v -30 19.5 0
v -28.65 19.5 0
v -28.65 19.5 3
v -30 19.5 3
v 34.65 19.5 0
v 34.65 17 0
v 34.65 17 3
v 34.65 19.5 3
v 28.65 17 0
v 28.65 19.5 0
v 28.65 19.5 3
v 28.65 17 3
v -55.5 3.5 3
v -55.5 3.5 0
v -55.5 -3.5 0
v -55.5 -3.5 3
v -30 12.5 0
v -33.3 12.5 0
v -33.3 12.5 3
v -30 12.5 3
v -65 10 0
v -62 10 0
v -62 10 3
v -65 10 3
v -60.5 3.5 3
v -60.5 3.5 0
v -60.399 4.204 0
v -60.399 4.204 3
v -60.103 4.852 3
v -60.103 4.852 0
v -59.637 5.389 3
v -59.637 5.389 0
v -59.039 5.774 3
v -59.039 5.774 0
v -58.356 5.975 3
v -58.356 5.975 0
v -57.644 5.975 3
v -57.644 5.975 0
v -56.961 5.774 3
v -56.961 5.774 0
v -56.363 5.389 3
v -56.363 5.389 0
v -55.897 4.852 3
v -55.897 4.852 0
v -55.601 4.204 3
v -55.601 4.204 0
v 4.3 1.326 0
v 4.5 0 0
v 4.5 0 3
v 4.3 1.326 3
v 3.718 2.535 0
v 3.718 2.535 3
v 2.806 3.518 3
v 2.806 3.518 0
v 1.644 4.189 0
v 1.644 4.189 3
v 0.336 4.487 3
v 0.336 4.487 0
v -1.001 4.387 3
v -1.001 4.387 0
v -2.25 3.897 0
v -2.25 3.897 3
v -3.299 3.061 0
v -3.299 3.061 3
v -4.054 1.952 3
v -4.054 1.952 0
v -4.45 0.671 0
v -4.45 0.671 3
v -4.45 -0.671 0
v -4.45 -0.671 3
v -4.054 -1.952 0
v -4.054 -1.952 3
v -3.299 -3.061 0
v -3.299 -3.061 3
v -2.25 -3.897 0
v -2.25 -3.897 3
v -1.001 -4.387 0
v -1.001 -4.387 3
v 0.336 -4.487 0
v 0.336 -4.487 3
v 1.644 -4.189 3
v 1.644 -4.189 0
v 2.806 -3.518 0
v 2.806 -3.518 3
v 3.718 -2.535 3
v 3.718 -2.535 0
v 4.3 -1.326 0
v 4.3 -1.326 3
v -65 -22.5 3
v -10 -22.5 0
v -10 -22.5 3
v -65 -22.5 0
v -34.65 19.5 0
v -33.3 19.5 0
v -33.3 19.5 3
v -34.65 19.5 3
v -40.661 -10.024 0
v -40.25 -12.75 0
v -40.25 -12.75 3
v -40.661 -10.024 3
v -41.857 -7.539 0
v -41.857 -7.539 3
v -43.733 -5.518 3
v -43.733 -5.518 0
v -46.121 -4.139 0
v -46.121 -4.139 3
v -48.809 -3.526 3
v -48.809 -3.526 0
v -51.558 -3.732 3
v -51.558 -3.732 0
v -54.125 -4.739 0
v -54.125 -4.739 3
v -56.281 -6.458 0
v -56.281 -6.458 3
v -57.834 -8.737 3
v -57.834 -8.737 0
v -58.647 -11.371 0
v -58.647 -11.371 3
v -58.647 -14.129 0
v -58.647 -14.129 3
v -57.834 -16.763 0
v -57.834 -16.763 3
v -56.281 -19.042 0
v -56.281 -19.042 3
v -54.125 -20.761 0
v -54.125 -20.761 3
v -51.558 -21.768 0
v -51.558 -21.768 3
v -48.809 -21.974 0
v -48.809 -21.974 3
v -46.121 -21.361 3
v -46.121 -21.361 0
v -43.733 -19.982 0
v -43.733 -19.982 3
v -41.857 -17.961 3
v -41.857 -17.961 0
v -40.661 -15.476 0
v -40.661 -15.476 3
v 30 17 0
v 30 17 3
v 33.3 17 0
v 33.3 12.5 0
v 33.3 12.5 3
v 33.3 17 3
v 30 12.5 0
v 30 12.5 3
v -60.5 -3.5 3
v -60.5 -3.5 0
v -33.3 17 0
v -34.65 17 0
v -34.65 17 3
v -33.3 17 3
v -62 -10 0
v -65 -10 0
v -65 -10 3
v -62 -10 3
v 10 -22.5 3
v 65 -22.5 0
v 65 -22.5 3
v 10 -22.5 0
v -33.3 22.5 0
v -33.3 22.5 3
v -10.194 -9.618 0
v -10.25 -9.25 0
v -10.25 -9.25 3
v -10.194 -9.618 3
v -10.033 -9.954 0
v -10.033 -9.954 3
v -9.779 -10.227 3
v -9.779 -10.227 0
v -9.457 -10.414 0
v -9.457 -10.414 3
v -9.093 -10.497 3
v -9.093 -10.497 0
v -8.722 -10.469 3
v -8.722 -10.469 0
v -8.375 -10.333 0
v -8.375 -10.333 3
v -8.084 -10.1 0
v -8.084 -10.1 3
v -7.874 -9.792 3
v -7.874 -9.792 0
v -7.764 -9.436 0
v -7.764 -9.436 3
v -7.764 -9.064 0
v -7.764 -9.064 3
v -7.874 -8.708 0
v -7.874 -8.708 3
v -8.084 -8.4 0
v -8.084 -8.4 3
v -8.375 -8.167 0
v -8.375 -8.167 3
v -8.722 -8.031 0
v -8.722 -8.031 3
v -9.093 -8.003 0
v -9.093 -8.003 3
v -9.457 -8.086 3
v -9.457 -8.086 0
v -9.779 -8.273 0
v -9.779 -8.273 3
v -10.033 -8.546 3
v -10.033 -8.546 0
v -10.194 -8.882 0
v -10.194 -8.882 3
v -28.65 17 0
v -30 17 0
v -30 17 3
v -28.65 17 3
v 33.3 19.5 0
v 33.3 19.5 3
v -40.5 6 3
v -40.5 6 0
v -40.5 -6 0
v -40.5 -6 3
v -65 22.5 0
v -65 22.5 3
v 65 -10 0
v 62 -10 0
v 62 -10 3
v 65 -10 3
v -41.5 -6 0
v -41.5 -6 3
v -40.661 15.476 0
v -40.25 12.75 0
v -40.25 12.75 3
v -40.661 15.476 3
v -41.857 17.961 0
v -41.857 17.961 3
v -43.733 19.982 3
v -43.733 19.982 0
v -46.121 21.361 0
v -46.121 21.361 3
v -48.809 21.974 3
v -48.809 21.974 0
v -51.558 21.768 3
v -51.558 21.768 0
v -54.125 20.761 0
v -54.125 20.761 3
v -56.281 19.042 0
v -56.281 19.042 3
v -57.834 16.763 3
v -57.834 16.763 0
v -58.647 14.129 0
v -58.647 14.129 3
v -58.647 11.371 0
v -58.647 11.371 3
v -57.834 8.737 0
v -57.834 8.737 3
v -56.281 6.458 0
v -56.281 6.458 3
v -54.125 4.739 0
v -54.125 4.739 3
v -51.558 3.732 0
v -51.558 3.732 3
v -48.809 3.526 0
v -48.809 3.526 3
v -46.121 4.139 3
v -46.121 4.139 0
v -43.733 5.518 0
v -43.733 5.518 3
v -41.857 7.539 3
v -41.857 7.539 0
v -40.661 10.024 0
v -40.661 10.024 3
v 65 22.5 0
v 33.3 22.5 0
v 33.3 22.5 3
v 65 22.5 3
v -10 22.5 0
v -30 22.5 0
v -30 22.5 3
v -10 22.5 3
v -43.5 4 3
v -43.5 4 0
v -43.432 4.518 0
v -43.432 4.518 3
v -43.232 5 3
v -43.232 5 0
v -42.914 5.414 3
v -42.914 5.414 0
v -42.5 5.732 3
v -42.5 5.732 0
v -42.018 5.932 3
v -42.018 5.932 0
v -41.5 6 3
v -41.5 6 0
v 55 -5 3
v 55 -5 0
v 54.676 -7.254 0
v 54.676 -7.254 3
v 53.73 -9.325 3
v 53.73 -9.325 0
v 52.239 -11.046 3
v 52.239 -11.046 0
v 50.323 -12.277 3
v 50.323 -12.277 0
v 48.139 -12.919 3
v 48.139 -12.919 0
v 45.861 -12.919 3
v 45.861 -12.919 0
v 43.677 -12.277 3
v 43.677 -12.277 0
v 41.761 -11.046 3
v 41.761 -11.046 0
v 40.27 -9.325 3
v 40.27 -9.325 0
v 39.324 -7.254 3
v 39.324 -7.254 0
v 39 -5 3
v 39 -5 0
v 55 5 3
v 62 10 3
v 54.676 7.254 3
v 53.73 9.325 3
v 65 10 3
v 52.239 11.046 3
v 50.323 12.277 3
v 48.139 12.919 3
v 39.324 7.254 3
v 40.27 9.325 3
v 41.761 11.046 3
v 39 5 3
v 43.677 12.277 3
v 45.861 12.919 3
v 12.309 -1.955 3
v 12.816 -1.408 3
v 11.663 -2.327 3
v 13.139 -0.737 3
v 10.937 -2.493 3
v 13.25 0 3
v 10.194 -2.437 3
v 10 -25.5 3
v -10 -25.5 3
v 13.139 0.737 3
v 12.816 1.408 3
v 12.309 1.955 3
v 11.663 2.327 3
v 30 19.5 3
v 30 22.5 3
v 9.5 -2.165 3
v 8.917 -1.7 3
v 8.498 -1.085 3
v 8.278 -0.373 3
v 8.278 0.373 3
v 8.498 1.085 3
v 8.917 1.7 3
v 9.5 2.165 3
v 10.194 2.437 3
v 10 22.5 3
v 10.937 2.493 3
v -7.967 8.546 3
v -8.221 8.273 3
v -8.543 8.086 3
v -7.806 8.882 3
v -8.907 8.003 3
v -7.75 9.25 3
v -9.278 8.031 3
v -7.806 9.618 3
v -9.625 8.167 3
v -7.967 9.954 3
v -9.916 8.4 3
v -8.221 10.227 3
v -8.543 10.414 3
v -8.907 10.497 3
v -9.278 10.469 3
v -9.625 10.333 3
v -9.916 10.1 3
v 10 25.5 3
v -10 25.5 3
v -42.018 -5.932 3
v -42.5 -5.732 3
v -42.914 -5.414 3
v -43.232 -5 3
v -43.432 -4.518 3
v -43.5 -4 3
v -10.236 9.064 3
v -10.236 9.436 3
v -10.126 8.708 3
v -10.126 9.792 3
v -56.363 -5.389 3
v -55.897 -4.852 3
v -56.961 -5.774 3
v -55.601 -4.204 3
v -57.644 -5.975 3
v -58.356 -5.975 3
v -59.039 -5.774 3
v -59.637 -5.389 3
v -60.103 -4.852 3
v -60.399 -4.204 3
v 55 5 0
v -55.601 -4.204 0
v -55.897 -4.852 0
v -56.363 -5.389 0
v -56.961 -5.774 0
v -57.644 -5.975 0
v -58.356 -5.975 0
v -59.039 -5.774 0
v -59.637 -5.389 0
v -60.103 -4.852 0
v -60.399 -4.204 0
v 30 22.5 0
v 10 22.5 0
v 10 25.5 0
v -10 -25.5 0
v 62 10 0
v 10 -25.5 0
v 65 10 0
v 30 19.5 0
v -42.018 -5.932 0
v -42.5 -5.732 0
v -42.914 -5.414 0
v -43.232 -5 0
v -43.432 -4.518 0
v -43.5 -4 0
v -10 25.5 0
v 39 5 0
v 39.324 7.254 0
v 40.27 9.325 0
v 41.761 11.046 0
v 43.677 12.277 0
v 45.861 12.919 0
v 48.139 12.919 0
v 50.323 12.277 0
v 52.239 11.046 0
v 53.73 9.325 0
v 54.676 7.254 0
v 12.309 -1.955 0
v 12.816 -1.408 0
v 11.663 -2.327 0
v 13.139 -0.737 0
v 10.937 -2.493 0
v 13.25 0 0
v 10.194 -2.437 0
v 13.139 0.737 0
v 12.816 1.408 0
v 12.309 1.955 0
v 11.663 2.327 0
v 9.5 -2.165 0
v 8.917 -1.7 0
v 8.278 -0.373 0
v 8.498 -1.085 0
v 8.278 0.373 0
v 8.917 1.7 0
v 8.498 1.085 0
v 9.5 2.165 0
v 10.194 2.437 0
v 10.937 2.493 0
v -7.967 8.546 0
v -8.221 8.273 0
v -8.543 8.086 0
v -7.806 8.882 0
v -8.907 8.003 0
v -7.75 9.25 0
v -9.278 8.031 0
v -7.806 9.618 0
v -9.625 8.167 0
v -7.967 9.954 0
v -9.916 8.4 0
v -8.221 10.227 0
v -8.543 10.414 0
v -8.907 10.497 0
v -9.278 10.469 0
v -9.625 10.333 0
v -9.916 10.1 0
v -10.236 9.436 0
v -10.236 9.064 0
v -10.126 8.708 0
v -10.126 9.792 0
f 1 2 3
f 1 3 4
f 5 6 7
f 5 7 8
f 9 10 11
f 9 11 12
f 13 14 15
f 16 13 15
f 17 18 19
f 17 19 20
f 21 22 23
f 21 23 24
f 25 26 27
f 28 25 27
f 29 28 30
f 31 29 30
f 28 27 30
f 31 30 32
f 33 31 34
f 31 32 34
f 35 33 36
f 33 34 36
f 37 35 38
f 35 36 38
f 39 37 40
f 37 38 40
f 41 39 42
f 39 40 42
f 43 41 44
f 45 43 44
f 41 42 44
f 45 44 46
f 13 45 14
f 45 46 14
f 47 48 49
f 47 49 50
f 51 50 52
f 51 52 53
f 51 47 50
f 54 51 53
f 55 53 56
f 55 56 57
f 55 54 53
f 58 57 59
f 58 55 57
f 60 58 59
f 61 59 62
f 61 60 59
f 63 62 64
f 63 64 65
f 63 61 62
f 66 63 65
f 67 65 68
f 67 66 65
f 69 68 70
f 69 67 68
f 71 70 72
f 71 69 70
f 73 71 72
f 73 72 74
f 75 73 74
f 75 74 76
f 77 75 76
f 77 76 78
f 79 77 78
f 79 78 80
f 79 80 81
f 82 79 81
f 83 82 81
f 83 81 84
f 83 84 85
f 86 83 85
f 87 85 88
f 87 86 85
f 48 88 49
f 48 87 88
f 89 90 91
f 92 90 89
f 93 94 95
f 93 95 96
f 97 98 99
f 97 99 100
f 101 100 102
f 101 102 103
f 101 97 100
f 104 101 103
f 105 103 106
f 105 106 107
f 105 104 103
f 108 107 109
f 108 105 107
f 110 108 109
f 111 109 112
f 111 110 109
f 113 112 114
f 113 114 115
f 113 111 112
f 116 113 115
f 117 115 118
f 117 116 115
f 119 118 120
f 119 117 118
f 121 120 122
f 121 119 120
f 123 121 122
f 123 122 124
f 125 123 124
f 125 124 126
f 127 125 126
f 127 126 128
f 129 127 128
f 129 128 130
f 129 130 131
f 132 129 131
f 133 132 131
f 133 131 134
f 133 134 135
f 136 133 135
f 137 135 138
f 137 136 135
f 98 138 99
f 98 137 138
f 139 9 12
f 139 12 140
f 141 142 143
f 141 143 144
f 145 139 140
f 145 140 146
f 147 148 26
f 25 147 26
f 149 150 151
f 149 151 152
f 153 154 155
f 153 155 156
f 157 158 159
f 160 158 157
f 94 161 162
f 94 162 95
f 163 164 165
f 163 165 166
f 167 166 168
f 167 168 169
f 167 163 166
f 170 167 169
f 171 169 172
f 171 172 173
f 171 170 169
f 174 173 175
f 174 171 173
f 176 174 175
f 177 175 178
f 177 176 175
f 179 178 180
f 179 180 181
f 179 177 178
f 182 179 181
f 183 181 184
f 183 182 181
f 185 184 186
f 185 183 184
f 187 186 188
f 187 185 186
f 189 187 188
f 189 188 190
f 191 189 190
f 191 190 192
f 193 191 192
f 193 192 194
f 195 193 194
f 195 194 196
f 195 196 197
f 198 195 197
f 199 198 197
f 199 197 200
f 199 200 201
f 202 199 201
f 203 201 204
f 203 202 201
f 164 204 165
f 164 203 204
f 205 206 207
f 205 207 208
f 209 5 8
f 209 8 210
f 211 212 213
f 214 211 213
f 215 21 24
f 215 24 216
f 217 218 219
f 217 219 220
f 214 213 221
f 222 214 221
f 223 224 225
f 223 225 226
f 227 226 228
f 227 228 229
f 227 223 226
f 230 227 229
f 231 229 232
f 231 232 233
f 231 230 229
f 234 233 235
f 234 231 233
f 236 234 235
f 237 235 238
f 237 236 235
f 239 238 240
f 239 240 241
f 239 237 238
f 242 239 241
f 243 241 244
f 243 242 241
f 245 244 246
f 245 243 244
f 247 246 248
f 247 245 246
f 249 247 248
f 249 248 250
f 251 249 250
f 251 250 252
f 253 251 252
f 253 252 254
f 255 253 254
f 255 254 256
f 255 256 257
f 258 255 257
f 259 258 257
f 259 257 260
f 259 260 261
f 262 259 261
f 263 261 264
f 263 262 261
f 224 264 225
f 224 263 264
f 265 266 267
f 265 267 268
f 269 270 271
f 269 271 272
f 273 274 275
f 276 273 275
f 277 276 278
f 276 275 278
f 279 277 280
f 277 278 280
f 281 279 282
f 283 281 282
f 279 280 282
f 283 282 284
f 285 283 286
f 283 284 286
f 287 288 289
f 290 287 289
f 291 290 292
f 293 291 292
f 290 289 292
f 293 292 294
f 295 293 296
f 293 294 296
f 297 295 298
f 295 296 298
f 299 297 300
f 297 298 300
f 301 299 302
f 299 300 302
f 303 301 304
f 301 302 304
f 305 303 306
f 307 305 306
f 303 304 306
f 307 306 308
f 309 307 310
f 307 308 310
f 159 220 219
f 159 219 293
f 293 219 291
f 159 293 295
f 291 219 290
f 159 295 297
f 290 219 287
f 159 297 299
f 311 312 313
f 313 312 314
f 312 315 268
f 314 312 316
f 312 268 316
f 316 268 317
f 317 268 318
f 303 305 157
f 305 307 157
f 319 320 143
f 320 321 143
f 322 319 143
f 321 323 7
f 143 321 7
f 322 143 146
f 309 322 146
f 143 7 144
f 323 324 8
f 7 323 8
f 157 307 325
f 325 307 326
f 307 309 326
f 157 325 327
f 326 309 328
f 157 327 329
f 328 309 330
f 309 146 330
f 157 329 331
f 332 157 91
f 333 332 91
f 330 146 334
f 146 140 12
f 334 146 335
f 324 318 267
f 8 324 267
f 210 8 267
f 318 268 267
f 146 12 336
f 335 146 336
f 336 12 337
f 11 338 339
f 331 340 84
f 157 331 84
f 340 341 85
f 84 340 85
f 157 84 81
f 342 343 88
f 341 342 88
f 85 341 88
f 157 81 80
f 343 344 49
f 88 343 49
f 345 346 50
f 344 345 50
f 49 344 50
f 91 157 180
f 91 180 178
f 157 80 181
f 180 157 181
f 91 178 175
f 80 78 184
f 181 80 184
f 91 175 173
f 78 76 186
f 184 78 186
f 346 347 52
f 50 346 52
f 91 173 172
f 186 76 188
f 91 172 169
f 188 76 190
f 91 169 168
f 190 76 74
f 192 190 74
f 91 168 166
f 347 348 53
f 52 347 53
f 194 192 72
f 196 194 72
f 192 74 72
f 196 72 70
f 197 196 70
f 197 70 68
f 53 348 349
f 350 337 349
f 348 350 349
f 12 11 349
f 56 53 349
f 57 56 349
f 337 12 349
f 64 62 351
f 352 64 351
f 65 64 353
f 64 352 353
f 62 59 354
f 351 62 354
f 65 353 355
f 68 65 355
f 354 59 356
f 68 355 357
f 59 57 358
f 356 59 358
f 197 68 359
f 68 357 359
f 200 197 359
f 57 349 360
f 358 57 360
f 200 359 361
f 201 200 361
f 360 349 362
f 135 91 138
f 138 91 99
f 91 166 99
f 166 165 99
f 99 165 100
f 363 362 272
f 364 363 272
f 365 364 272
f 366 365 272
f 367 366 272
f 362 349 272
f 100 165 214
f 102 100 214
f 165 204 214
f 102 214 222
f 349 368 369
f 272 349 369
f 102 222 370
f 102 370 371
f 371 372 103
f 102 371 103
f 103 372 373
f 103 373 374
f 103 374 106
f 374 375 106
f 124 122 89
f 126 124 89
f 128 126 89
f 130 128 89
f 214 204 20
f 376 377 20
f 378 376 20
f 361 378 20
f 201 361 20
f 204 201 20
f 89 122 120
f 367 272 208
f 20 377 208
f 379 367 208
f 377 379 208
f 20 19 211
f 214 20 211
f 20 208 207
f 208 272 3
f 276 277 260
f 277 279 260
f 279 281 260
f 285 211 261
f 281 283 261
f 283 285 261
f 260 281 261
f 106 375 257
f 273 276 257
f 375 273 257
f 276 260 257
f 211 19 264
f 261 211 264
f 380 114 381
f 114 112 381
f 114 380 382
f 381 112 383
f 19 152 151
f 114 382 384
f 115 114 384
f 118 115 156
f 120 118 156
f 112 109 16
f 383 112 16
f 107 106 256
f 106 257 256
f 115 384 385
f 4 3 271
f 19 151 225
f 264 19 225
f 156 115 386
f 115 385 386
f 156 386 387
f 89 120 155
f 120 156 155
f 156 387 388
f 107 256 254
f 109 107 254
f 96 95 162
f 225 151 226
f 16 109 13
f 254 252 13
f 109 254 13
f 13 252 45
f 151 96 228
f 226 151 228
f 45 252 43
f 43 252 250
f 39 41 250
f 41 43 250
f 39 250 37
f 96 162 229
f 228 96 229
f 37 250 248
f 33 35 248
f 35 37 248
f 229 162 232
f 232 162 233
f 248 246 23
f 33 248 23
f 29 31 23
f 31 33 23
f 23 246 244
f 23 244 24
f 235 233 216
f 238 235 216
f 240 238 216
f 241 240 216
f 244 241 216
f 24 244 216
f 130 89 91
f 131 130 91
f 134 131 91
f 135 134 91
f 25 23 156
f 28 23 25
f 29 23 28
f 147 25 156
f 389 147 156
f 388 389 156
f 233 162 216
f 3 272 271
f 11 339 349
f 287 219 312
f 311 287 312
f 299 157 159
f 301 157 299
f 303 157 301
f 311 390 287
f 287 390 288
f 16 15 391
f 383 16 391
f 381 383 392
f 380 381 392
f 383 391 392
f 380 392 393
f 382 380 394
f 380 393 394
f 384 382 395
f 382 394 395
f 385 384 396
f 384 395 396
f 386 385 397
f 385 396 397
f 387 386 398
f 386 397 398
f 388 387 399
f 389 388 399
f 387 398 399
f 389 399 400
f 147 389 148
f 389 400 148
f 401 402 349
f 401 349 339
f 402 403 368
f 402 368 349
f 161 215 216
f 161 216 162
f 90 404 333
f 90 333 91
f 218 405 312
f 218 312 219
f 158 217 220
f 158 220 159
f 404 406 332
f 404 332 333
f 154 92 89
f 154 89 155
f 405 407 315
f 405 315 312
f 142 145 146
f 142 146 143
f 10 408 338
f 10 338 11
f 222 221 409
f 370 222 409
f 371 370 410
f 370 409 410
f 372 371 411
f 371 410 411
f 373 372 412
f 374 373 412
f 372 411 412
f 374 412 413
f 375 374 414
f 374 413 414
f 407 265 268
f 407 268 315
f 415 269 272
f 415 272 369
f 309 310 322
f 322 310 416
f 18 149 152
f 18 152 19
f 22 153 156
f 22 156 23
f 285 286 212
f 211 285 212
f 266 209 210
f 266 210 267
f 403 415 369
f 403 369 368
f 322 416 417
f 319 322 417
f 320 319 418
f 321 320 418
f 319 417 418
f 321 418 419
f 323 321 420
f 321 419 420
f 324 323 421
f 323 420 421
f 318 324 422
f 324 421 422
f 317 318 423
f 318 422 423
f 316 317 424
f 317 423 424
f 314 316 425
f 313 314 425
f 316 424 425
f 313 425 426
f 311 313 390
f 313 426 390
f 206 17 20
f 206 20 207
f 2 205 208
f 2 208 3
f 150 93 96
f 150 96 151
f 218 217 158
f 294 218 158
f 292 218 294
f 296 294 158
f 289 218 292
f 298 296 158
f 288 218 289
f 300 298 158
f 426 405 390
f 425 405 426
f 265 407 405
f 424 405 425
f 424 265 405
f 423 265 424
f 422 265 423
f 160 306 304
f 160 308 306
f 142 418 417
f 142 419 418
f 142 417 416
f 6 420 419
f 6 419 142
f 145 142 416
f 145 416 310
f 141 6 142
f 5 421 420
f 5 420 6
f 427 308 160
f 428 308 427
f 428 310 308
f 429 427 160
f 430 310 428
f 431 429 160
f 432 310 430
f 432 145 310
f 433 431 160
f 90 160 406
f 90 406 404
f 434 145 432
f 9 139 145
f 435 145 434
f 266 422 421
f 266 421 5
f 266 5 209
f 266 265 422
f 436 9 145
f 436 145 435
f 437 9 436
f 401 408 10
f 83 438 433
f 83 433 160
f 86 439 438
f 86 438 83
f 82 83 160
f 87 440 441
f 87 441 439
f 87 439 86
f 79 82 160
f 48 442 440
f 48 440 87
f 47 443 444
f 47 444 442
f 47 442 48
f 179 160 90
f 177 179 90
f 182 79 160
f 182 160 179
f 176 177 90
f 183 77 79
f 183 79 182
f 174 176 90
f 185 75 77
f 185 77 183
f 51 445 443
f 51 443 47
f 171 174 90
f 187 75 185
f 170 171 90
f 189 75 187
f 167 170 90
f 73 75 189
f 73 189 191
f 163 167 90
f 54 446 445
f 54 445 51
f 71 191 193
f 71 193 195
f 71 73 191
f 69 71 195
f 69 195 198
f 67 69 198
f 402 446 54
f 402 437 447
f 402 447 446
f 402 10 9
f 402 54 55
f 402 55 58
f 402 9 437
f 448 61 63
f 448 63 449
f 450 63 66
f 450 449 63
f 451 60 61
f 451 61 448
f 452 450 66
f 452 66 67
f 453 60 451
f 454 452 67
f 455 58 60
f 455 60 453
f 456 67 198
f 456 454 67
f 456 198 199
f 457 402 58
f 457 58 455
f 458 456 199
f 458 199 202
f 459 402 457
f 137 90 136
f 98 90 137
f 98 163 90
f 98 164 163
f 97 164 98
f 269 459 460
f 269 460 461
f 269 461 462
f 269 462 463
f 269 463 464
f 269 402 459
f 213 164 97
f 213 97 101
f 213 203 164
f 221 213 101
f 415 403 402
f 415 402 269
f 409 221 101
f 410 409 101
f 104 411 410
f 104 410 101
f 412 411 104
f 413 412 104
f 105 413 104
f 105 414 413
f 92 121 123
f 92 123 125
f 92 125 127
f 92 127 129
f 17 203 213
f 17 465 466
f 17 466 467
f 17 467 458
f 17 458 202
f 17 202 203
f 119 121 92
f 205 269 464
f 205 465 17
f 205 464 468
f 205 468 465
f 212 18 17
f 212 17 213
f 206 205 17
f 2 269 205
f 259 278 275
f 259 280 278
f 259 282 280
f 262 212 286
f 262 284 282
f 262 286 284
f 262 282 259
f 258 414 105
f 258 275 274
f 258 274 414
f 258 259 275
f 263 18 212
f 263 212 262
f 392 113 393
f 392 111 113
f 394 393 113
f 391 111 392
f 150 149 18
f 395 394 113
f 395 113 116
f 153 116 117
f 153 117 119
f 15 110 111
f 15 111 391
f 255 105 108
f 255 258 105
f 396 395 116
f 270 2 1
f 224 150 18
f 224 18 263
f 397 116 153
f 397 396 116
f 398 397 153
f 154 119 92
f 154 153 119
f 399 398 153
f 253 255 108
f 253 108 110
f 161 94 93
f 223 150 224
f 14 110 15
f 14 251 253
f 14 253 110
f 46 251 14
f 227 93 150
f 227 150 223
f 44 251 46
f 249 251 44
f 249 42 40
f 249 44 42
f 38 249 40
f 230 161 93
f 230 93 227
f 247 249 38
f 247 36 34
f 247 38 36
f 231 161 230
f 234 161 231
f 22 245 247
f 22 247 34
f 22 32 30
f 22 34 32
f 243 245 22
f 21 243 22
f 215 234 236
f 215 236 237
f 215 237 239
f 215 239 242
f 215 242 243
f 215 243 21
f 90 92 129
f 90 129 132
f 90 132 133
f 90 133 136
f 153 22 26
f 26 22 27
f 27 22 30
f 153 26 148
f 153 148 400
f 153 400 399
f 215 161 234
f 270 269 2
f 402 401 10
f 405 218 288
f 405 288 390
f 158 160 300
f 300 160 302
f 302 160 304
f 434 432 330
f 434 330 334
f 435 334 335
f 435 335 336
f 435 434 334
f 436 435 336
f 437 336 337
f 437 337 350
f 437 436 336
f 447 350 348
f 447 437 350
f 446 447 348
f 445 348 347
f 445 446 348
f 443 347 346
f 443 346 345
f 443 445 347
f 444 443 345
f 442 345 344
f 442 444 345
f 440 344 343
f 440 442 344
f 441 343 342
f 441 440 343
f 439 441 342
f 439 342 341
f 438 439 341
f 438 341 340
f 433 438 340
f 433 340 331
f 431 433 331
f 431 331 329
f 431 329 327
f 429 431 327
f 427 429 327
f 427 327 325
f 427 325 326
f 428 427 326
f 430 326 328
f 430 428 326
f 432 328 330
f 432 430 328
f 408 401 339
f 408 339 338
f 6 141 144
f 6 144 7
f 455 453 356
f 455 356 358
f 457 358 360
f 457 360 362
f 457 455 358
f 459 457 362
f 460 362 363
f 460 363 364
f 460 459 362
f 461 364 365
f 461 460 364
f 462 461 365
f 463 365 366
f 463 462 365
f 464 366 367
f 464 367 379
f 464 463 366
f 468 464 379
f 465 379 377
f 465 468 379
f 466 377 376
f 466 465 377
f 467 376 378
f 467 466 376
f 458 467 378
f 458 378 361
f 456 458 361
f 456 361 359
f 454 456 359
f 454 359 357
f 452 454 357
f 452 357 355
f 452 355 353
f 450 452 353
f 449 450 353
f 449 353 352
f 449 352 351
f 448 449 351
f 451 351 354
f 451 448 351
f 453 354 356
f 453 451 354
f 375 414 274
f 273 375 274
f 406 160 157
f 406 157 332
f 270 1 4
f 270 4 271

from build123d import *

# Parameters (mm, degrees)
SKETCH1_R           = 9.25
SKETCH1_R_2         = 4.5
SKETCH1_R_3         = 2.5
SKETCH1_R_4         = 1.25
BOSS_EXTRUDE1_DEPTH = 3


with BuildPart() as part:
    # Sketch1 → Boss-Extrude1 (new body)
    with BuildSketch(Plane.XY):
        Polygon((-10, -22.5), (-65, -22.5), (-65, -10), (-62, -10), (-62, 10), (-65, 10), (-65, 22.5), (-33.3, 22.5), (-33.3, 19.5), (-34.65, 19.5), (-34.65, 17), (-33.3, 17), (-33.3, 12.5), (-30, 12.5), (-30, 17), (-28.65, 17), (-28.65, 19.5), (-30, 19.5), (-30, 22.5), (-10, 22.5), (-10, 25.5), (10, 25.5), (10, 22.5), (30, 22.5), (30, 19.5), (28.65, 19.5), (28.65, 17), (30, 17), (30, 12.5), (33.3, 12.5), (33.3, 17), (34.65, 17), (34.65, 19.5), (33.3, 19.5), (33.3, 22.5), (65, 22.5), (65, 10), (62, 10), (62, -10), (65, -10), (65, -22.5), (10, -22.5), (10, -25.5), (-10, -25.5), align=None)
        with Locations((-49.5, 12.75)):
            Circle(SKETCH1_R, mode=Mode.SUBTRACT)
        with Locations((-49.5, -12.75)):
            Circle(SKETCH1_R, mode=Mode.SUBTRACT)
        Circle(SKETCH1_R_2, mode=Mode.SUBTRACT)
        with Locations((10.75, 0)):
            Circle(SKETCH1_R_3, mode=Mode.SUBTRACT)
        with Locations((-9, 9.25)):
            Circle(SKETCH1_R_4, mode=Mode.SUBTRACT)
        with Locations(Location((-9, -9.25, 0), (0, 0, 180))):
            Circle(SKETCH1_R_4, mode=Mode.SUBTRACT)
        with BuildLine():
            Line((-55.5, 3.5), (-55.5, -3.5))
            ThreePointArc((-55.5, -3.5), (-58, -6), (-60.5, -3.5))
            Line((-60.5, -3.5), (-60.5, 3.5))
            ThreePointArc((-60.5, 3.5), (-58, 6), (-55.5, 3.5))
        make_face(mode=Mode.SUBTRACT)
        with BuildLine():
            Line((-40.5, -6), (-41.5, -6))
            ThreePointArc((-41.5, -6), (-42.914213562, -5.414213562), (-43.5, -4))
            Line((-43.5, -4), (-43.5, 4))
            ThreePointArc((-43.5, 4), (-42.914213562, 5.414213562), (-41.5, 6))
            Line((-41.5, 6), (-40.5, 6))
            Line((-40.5, 6), (-40.5, -6))
        make_face(mode=Mode.SUBTRACT)
        with BuildLine():
            Line((39, -5), (39, 5))
            ThreePointArc((39, 5), (47, 13), (55, 5))
            Line((55, 5), (55, -5))
            ThreePointArc((55, -5), (47, -13), (39, -5))
        make_face(mode=Mode.SUBTRACT)
    extrude(amount=BOSS_EXTRUDE1_DEPTH)


solid = part.part
